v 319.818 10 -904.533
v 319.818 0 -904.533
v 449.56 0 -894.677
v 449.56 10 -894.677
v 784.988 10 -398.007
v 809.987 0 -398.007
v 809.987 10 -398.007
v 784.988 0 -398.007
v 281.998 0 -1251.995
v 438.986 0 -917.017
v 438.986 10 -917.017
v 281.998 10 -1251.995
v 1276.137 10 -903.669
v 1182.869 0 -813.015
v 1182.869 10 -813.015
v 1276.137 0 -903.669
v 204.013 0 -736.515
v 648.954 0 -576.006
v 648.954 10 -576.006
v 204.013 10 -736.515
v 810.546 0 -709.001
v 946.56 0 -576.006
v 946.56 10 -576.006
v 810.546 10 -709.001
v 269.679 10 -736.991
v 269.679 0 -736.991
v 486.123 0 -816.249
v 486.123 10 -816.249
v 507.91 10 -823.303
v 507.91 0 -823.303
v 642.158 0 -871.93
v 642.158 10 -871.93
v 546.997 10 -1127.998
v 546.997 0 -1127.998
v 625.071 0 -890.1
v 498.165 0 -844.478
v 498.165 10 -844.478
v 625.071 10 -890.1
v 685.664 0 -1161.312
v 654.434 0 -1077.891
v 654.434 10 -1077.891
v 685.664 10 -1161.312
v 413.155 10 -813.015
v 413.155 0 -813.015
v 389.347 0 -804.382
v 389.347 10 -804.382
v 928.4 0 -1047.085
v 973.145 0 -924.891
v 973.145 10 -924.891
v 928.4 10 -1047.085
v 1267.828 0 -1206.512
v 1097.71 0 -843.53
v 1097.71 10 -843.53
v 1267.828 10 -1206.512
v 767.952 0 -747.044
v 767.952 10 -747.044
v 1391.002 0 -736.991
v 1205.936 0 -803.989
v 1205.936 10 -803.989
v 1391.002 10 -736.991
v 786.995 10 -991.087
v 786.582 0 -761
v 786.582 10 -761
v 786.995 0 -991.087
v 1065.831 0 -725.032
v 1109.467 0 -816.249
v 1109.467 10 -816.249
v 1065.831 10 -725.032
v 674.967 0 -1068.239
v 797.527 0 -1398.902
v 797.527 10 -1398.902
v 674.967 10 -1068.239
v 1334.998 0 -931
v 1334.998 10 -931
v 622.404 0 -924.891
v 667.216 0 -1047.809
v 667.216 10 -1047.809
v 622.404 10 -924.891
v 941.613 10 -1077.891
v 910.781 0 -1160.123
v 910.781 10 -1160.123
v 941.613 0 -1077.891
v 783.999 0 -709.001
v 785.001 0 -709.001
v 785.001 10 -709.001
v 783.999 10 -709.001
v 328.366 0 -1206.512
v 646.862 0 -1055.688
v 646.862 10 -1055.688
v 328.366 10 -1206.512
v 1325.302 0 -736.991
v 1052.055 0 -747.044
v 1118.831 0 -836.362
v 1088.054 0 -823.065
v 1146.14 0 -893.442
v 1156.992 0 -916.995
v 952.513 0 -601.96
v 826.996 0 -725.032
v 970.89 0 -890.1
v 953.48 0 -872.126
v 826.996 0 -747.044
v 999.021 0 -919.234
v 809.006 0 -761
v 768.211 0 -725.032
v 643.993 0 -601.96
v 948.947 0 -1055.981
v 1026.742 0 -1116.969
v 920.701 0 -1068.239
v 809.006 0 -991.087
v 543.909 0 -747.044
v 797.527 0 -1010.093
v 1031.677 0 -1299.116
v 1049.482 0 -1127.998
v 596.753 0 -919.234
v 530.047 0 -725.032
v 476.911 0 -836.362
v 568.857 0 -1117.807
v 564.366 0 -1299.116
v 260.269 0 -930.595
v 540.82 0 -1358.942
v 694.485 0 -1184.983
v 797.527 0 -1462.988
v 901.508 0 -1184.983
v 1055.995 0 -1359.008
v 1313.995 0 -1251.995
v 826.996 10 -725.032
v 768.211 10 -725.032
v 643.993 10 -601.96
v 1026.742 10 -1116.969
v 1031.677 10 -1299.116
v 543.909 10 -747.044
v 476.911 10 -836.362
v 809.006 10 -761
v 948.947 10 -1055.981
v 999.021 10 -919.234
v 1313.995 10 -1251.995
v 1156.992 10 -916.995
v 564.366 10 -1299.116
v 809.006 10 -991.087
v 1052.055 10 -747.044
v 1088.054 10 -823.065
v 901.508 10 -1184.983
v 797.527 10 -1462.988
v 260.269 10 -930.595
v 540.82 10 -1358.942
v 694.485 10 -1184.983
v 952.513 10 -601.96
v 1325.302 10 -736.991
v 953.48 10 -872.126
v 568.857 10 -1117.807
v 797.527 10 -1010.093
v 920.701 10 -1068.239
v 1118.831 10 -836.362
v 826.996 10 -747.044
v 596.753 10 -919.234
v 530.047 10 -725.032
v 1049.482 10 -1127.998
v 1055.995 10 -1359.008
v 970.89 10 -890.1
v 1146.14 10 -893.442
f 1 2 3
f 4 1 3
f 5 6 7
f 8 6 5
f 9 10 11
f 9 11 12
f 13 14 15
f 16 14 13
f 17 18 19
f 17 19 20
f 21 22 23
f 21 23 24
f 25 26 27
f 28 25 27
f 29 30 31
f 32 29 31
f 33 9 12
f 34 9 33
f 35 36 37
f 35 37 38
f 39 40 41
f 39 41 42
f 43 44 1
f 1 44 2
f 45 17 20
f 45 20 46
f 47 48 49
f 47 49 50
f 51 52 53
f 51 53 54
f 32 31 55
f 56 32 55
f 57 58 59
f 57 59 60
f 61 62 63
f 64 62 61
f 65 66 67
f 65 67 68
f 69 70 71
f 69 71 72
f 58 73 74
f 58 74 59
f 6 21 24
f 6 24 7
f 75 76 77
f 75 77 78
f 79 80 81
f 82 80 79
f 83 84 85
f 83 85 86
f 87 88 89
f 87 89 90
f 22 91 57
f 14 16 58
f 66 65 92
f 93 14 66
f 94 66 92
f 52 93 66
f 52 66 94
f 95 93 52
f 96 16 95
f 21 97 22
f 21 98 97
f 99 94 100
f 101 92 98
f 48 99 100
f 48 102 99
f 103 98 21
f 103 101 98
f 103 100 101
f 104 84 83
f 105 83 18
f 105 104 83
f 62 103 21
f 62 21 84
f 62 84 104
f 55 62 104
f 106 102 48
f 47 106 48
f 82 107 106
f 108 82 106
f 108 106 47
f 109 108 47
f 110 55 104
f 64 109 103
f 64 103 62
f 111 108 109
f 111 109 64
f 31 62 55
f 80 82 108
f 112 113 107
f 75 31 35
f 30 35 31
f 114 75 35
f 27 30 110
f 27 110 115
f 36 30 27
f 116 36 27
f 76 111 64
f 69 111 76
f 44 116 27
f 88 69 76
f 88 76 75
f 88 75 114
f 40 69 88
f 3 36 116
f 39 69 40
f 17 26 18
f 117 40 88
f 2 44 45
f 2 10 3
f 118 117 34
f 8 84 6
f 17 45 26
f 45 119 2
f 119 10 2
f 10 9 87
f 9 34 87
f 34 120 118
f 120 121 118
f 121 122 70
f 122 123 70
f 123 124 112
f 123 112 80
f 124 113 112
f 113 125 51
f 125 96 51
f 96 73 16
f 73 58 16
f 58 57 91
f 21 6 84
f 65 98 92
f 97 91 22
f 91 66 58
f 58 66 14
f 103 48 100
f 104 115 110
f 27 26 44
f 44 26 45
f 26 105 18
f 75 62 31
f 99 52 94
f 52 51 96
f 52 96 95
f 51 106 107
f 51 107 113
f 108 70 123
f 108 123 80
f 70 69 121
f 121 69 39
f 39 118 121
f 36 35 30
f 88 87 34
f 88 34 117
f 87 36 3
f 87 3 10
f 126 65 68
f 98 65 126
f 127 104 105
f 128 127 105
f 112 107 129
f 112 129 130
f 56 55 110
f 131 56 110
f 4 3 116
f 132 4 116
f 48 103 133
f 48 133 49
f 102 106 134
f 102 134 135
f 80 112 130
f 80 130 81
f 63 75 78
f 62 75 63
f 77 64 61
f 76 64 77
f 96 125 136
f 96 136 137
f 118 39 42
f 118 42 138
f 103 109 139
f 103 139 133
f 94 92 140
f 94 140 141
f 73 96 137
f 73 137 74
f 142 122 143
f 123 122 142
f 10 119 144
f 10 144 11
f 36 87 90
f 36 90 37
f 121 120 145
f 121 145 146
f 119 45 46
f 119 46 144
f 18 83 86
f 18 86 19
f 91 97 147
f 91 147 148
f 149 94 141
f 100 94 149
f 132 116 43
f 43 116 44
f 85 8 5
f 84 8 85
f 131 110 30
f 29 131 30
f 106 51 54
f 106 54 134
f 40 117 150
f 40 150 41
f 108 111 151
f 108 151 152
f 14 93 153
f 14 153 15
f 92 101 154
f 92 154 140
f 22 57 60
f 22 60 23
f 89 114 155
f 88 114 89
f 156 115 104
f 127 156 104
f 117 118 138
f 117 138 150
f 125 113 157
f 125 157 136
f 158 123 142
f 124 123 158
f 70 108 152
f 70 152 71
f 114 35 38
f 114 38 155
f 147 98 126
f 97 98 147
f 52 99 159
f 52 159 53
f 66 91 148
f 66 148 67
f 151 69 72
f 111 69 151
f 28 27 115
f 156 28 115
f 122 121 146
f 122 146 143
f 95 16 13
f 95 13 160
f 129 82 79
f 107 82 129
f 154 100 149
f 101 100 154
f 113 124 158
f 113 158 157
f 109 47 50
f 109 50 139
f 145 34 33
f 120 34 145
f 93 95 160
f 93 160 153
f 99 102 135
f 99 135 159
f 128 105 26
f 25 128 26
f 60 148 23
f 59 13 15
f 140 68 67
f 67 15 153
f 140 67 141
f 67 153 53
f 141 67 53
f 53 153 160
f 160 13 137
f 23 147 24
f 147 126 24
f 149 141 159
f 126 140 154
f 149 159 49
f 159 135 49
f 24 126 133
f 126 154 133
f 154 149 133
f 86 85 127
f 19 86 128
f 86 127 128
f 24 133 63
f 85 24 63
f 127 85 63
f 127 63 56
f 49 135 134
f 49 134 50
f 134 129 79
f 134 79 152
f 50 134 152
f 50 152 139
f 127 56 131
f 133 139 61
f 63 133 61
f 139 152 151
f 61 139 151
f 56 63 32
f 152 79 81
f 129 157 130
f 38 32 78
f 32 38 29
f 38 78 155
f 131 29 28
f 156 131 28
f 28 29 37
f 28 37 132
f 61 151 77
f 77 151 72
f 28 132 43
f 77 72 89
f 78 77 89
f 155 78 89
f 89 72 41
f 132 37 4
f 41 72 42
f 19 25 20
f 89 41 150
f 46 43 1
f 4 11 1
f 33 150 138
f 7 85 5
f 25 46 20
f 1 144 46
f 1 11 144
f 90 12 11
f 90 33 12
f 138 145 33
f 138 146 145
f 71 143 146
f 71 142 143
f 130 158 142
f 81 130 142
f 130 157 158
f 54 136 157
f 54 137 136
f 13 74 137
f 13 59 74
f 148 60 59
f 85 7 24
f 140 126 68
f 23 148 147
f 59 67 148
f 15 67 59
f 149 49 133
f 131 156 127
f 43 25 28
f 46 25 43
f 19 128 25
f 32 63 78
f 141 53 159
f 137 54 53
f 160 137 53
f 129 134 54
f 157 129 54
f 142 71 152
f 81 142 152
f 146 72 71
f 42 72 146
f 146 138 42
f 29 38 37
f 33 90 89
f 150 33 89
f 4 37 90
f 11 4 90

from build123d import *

# Parameters (mm, degrees)
BOSS_EXTRUDE1_DEPTH = 10


with BuildPart() as part:
    # Sketch1 → Boss-Extrude1 (new body)
    with BuildSketch(Plane(origin=(0, 0, 0), x_dir=(1, 0, 0), z_dir=(0, 1, 0))):
        Polygon((784.987851723, 398.007183844), (785.000571871, 709.000734601), (783.999038632, 709.000734601), (648.95430554, 576.00627914), (204.012861183, 736.515465829), (389.346795443, 804.38206818), (260.269155542, 930.594602451), (438.985812263, 917.017059796), (281.997531244, 1251.994529906), (546.997134557, 1127.998293592), (540.820297596, 1358.942378927), (694.484658499, 1184.98269214), (797.527155209, 1462.988304378), (901.507891553, 1184.98269214), (1055.994737963, 1359.007597162), (1049.481640439, 1127.998293592), (1313.995431768, 1251.994529906), (1156.991756683, 916.99500763), (1334.998347933, 930.999939378), (1205.935810073, 803.988718502), (1391.001934492, 736.990931112), (946.559511347, 576.00627914), (810.545996287, 709.000734601), (809.987230906, 398.007183844), align=None)
        Polygon((768.211437064, 725.031722001), (643.992624095, 601.960316667), (269.679365999, 736.990931112), (486.122884579, 816.249412651), (530.047300467, 725.031722001), align=None, mode=Mode.SUBTRACT)
        Polygon((826.995686835, 725.031722001), (952.513065316, 601.960316667), (1325.302227186, 736.990931112), (1109.467295774, 816.249412651), (1065.831329223, 725.031722001), align=None, mode=Mode.SUBTRACT)
        Polygon((826.995686835, 747.043809063), (1052.054612149, 747.043809063), (1088.054253232, 823.06470125), (953.479995281, 872.126355119), align=None, mode=Mode.SUBTRACT)
        Polygon((767.95234015, 747.043809063), (543.908716076, 747.043809063), (507.909790164, 823.302917015), (642.157906737, 871.929882397), align=None, mode=Mode.SUBTRACT)
        Polygon((476.91056803, 836.361945246), (413.154674671, 813.015460537), (319.817787826, 904.533479576), (449.560148715, 894.676634268), align=None, mode=Mode.SUBTRACT)
        Polygon((1118.830884035, 836.361945246), (1182.869407152, 813.015460537), (1276.136882601, 903.669224766), (1146.140420035, 893.441560875), align=None, mode=Mode.SUBTRACT)
        Polygon((809.005952687, 760.999981232), (973.14510679, 924.891191926), (928.399604701, 1047.084725346), (809.005952687, 991.087402872), align=None, mode=Mode.SUBTRACT)
        Polygon((786.581669339, 760.999981232), (786.995069828, 991.087402872), (667.215871678, 1047.808759575), (622.403890172, 924.891191926), align=None, mode=Mode.SUBTRACT)
        Polygon((625.071199804, 890.100070463), (596.75349244, 919.234228308), (646.861936517, 1055.688427033), (328.365599037, 1206.51214806), (498.164892008, 844.477736382), align=None, mode=Mode.SUBTRACT)
        Polygon((970.890065096, 890.100070463), (1097.709804078, 843.529573856), (1267.828250082, 1206.51214806), (948.946832949, 1055.980771306), (999.021436359, 919.234228308), align=None, mode=Mode.SUBTRACT)
        Polygon((797.527155209, 1010.09324616), (920.701437633, 1068.238980962), (797.527155209, 1398.902304133), (674.967131634, 1068.238980962), align=None, mode=Mode.SUBTRACT)
        Polygon((654.433985107, 1077.890698346), (685.66424413, 1161.312305797), (564.365750317, 1299.115972687), (568.857249407, 1117.806751608), align=None, mode=Mode.SUBTRACT)
        Polygon((941.613316466, 1077.890698346), (1026.742088945, 1116.968977072), (1031.676560348, 1299.115972687), (910.781362362, 1160.123449622), align=None, mode=Mode.SUBTRACT)
    extrude(amount=BOSS_EXTRUDE1_DEPTH)


solid = part.part
